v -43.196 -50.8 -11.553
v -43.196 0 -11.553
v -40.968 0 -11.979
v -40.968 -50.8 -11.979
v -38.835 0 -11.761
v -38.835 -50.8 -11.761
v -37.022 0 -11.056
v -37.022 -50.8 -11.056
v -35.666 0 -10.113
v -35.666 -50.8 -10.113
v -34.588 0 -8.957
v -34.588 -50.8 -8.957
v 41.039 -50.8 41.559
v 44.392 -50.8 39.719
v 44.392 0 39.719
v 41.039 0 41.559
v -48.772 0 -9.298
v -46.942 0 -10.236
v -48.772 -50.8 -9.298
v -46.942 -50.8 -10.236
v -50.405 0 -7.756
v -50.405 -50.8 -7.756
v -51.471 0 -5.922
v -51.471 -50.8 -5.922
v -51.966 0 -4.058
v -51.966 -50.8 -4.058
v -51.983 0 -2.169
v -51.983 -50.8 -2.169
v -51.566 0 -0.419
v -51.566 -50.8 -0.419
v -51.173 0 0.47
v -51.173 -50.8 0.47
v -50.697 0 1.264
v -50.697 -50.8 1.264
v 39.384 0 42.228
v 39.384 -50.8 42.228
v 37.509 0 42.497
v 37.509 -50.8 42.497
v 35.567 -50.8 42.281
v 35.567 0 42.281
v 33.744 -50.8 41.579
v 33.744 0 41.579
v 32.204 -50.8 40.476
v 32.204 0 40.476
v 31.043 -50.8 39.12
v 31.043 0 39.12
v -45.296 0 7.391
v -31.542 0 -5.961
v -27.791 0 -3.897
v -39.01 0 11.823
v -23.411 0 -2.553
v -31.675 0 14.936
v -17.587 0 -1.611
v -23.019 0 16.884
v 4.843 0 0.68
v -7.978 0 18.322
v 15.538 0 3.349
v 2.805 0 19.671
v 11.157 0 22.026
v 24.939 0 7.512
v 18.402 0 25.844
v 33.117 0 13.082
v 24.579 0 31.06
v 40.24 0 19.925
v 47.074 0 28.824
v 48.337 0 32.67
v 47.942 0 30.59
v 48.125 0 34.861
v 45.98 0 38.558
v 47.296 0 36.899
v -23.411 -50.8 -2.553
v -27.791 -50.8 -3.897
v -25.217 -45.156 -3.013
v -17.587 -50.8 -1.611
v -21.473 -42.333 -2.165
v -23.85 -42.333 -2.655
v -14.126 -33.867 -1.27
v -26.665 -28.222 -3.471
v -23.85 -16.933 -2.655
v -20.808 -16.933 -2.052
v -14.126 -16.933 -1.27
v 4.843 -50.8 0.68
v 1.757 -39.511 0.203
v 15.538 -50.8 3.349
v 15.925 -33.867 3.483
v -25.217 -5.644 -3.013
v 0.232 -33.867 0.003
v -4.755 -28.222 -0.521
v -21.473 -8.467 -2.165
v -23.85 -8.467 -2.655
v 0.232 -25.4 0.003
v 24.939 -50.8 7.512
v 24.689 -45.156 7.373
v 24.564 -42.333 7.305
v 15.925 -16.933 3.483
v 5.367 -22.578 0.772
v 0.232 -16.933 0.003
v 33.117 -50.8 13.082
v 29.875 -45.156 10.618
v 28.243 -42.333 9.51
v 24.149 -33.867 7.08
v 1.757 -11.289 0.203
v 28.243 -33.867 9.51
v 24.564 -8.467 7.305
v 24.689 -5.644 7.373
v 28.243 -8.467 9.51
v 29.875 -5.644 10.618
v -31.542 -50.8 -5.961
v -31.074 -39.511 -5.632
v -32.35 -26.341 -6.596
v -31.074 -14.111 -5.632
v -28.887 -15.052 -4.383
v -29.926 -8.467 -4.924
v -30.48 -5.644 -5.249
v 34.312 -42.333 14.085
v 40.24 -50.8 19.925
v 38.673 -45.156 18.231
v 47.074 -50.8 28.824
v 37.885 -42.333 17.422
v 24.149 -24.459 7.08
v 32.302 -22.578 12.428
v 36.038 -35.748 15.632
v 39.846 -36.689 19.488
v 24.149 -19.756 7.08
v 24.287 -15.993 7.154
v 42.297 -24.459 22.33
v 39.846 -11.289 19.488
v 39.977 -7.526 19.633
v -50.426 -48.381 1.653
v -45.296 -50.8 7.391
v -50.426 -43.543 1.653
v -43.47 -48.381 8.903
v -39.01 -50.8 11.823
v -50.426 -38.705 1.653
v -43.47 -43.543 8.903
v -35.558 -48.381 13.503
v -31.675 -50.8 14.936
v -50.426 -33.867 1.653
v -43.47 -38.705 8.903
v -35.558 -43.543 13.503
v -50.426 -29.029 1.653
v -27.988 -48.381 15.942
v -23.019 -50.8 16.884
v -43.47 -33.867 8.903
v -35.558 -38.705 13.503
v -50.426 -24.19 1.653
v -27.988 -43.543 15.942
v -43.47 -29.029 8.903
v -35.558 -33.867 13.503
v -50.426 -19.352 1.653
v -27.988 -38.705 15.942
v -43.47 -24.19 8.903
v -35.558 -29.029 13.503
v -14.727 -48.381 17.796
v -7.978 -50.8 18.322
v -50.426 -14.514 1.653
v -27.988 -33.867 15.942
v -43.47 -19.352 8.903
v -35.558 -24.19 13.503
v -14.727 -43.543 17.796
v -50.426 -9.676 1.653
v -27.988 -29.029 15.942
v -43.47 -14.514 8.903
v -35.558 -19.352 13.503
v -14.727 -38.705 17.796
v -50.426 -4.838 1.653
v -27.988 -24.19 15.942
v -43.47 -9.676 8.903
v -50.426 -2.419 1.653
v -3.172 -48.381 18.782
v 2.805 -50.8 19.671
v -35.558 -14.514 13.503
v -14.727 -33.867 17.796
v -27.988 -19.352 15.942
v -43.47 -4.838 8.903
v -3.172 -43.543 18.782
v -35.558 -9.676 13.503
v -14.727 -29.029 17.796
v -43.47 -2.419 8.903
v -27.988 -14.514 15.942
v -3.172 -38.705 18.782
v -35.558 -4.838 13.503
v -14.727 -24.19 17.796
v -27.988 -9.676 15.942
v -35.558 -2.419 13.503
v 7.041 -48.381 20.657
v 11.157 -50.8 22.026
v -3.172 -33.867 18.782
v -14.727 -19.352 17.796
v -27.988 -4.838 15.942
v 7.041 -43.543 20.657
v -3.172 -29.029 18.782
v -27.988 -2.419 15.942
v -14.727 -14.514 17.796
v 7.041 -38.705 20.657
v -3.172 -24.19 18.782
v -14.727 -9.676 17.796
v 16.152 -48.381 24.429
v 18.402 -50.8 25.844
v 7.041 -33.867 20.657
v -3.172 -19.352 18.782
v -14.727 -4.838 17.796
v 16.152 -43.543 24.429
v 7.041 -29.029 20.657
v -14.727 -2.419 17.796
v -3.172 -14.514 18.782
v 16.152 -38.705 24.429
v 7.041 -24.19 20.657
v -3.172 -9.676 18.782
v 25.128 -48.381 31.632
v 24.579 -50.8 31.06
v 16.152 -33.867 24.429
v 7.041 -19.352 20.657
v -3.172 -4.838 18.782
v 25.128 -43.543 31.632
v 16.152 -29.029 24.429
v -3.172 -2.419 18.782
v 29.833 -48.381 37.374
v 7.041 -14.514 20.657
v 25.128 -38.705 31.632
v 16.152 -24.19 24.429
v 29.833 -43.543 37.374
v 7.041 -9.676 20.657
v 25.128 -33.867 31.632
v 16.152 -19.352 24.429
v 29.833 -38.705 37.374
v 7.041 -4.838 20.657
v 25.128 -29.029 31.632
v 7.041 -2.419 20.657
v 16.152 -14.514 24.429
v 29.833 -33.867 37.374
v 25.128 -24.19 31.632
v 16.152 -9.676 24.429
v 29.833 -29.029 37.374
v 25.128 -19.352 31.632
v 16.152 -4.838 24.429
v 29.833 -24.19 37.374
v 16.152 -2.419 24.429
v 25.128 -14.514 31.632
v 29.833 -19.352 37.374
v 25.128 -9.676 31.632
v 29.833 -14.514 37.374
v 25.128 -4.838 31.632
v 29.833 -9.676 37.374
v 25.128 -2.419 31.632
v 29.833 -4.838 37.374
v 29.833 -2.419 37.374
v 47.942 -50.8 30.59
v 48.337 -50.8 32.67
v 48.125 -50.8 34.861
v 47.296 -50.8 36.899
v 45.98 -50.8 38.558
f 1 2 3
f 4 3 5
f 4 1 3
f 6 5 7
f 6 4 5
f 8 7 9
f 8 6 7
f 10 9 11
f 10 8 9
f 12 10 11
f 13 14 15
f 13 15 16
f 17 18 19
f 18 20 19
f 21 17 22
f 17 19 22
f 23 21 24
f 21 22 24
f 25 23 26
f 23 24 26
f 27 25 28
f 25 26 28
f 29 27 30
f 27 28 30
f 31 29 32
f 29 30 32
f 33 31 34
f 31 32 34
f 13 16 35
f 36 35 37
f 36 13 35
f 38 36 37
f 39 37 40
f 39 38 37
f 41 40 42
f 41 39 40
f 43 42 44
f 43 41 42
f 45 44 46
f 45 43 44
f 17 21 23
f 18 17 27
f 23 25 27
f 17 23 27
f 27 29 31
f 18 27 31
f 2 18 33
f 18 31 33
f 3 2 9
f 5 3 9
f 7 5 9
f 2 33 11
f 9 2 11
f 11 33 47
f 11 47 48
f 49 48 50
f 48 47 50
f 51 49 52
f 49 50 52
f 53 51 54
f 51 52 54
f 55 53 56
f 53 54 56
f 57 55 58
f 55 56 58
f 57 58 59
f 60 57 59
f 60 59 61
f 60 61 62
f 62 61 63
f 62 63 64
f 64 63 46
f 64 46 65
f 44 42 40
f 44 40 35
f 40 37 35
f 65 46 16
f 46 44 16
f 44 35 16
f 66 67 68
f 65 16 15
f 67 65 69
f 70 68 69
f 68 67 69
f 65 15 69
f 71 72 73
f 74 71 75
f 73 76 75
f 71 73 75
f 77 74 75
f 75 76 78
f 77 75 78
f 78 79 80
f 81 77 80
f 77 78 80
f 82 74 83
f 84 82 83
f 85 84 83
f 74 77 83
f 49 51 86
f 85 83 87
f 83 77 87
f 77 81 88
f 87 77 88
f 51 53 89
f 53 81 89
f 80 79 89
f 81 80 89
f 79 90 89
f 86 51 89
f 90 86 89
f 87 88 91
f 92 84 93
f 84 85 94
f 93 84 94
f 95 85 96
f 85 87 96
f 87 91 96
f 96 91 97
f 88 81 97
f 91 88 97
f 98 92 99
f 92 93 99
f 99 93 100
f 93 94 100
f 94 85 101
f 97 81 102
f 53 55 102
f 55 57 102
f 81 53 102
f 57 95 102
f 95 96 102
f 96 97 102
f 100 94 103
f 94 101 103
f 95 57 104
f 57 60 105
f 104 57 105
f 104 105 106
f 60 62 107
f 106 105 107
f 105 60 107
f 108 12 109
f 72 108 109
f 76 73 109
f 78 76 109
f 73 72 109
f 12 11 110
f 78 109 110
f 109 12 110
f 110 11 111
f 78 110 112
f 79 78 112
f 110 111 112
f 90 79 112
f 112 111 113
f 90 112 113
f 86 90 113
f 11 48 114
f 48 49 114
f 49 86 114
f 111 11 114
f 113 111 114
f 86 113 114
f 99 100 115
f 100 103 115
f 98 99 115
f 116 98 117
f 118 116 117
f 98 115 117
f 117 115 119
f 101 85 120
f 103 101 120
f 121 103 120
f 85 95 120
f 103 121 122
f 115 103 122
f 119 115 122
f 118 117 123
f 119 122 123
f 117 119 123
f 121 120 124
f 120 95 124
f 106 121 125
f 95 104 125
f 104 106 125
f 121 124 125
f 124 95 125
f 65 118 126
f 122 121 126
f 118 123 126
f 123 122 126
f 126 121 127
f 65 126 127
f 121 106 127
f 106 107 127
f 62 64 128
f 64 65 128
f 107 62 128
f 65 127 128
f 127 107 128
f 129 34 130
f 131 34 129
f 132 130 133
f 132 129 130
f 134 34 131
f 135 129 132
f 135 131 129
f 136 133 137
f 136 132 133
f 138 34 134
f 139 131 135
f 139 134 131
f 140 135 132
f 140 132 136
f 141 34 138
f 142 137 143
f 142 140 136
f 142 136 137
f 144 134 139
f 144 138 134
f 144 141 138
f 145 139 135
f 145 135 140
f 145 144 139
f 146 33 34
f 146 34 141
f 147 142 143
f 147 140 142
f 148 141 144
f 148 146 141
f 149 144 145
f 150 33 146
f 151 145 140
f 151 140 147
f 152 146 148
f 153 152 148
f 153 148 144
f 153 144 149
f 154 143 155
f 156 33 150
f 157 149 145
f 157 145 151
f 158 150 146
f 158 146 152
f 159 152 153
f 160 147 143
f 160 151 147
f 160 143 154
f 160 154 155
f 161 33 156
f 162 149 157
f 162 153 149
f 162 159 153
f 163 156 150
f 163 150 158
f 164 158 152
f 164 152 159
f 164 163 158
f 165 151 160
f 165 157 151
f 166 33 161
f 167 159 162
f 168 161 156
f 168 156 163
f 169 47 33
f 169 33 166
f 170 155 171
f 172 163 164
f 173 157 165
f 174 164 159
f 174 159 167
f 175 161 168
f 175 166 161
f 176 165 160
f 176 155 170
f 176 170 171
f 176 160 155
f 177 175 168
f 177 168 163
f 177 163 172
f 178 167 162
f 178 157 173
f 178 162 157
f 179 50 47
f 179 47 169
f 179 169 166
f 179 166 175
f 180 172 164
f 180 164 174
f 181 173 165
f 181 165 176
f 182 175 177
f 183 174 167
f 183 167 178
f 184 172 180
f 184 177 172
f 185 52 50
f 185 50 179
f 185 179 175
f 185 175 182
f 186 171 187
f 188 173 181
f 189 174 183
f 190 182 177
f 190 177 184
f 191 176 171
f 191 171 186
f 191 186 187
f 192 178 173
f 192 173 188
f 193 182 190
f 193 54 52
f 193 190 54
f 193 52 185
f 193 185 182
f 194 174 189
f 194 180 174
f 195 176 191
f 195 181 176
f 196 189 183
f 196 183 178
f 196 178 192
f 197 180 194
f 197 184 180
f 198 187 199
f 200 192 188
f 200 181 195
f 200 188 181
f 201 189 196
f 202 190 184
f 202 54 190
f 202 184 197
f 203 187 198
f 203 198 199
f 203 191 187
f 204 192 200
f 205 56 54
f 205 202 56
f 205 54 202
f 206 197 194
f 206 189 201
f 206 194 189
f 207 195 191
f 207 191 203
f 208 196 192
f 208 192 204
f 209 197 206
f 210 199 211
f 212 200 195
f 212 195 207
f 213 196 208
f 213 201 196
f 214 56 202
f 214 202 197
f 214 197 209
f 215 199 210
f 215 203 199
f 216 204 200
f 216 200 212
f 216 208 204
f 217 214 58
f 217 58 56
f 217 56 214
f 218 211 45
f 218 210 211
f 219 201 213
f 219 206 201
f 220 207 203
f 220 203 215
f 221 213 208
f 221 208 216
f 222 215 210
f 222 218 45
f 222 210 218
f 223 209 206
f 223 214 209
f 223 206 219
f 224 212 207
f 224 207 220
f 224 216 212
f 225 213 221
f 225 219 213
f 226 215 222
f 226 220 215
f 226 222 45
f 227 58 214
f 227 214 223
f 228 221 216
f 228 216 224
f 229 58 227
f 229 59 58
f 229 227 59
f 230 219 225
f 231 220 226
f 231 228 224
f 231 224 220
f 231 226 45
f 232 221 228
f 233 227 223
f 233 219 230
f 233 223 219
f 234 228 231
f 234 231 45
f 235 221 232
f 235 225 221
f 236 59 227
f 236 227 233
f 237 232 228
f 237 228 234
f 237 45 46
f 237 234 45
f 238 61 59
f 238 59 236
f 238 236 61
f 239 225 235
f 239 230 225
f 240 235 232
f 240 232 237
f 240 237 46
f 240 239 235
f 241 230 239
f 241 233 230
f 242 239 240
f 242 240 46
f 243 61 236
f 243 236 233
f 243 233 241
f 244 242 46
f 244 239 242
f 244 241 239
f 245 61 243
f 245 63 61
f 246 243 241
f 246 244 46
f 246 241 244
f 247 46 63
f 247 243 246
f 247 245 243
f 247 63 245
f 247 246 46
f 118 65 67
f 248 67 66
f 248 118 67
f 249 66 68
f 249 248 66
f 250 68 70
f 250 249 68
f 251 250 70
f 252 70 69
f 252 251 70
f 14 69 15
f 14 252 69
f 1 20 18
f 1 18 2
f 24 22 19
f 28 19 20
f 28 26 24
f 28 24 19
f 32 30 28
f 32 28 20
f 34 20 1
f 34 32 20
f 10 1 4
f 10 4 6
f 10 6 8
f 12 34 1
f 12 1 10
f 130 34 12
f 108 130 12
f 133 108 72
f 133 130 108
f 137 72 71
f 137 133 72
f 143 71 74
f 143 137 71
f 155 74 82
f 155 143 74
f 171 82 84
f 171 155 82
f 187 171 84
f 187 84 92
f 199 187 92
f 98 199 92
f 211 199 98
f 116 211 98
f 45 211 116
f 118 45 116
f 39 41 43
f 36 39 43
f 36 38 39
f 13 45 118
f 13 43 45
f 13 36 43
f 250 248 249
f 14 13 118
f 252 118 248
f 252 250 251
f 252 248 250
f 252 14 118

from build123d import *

# Parameters (mm, degrees)
F1_DEPTH = 50.8
F2_R     = 7.62


# Not quite as in the source:
# - the dataset's text gives a spline's control points without its knots; the knots are read off the source's solid


with BuildPart() as f1:
    # F0 (on Front) → F1 (new body)
    with BuildSketch(Plane.XZ):
        with BuildLine():
            Line((-55.0485830889, -7.3852598701), (-37.0773832593, -13.7049494734))
            add(Edge.make_bspline(
                [(-37.0773832593, -13.7049494734), (-27.6241134369, 13.1771620994), (20.1415180746, -20.9665218169), (51.3441984318, 35.9048443187)],
                knots=[0, 0, 0, 0, 101.3879073107, 101.3879073107, 101.3879073107, 101.3879073107], degree=3))
            Line((51.3441984318, 35.9048443187), (34.642799002, 45.0681274141))
            add(Edge.make_bspline(
                [(-55.0485830889, -7.3852598701), (-54.4926390919, -5.8043308542), (-53.1764213729, -2.6875146015), (-50.5314293038, 1.7278867732), (-47.2538632861, 5.6910743545), (-43.5082758092, 9.0216121231), (-39.5319485188, 11.6412421502), (-35.5389972848, 13.5945362808), (-31.6628107822, 15.0000075173), (-27.9581465021, 15.9916019071), (-24.4299846836, 16.6866792977), (-19.9382693628, 17.339586267), (-14.6614899569, 17.8227328201), (-8.7222195676, 18.2449955114), (-3.1169497995, 18.7421505919), (2.1567072949, 19.480252644), (7.091946379, 20.579587662), (11.7222503062, 22.1410595224), (16.1562527032, 24.2936211212), (20.5635300178, 27.2573066834), (25.0979351909, 31.3713560869), (29.8139291199, 37.0473286244), (33.0357743953, 42.1390942751), (34.642799002, 45.0681274141)],
                knots=[0, 0, 0, 0, 0.03125, 0.0625, 0.09375, 0.125, 0.15625, 0.1875, 0.21875, 0.25, 0.28125, 0.3125, 0.375, 0.4375, 0.5, 0.5625, 0.625, 0.6875, 0.75, 0.8125, 0.875, 0.9375, 1, 1, 1, 1], degree=3))
        make_face()
    extrude(amount=F1_DEPTH)

    # F2
    f2_edges = [f1.edges().sort_by_distance(p)[0] for p in [
        (34.642799, -25.4, 45.068127),
        (51.344198, -25.4, 35.904844),
        (-55.048583, -25.4, -7.38526),
        (-37.077383, -25.4, -13.704949),
    ]]
    fillet(f2_edges, radius=F2_R)


solid = f1.part
